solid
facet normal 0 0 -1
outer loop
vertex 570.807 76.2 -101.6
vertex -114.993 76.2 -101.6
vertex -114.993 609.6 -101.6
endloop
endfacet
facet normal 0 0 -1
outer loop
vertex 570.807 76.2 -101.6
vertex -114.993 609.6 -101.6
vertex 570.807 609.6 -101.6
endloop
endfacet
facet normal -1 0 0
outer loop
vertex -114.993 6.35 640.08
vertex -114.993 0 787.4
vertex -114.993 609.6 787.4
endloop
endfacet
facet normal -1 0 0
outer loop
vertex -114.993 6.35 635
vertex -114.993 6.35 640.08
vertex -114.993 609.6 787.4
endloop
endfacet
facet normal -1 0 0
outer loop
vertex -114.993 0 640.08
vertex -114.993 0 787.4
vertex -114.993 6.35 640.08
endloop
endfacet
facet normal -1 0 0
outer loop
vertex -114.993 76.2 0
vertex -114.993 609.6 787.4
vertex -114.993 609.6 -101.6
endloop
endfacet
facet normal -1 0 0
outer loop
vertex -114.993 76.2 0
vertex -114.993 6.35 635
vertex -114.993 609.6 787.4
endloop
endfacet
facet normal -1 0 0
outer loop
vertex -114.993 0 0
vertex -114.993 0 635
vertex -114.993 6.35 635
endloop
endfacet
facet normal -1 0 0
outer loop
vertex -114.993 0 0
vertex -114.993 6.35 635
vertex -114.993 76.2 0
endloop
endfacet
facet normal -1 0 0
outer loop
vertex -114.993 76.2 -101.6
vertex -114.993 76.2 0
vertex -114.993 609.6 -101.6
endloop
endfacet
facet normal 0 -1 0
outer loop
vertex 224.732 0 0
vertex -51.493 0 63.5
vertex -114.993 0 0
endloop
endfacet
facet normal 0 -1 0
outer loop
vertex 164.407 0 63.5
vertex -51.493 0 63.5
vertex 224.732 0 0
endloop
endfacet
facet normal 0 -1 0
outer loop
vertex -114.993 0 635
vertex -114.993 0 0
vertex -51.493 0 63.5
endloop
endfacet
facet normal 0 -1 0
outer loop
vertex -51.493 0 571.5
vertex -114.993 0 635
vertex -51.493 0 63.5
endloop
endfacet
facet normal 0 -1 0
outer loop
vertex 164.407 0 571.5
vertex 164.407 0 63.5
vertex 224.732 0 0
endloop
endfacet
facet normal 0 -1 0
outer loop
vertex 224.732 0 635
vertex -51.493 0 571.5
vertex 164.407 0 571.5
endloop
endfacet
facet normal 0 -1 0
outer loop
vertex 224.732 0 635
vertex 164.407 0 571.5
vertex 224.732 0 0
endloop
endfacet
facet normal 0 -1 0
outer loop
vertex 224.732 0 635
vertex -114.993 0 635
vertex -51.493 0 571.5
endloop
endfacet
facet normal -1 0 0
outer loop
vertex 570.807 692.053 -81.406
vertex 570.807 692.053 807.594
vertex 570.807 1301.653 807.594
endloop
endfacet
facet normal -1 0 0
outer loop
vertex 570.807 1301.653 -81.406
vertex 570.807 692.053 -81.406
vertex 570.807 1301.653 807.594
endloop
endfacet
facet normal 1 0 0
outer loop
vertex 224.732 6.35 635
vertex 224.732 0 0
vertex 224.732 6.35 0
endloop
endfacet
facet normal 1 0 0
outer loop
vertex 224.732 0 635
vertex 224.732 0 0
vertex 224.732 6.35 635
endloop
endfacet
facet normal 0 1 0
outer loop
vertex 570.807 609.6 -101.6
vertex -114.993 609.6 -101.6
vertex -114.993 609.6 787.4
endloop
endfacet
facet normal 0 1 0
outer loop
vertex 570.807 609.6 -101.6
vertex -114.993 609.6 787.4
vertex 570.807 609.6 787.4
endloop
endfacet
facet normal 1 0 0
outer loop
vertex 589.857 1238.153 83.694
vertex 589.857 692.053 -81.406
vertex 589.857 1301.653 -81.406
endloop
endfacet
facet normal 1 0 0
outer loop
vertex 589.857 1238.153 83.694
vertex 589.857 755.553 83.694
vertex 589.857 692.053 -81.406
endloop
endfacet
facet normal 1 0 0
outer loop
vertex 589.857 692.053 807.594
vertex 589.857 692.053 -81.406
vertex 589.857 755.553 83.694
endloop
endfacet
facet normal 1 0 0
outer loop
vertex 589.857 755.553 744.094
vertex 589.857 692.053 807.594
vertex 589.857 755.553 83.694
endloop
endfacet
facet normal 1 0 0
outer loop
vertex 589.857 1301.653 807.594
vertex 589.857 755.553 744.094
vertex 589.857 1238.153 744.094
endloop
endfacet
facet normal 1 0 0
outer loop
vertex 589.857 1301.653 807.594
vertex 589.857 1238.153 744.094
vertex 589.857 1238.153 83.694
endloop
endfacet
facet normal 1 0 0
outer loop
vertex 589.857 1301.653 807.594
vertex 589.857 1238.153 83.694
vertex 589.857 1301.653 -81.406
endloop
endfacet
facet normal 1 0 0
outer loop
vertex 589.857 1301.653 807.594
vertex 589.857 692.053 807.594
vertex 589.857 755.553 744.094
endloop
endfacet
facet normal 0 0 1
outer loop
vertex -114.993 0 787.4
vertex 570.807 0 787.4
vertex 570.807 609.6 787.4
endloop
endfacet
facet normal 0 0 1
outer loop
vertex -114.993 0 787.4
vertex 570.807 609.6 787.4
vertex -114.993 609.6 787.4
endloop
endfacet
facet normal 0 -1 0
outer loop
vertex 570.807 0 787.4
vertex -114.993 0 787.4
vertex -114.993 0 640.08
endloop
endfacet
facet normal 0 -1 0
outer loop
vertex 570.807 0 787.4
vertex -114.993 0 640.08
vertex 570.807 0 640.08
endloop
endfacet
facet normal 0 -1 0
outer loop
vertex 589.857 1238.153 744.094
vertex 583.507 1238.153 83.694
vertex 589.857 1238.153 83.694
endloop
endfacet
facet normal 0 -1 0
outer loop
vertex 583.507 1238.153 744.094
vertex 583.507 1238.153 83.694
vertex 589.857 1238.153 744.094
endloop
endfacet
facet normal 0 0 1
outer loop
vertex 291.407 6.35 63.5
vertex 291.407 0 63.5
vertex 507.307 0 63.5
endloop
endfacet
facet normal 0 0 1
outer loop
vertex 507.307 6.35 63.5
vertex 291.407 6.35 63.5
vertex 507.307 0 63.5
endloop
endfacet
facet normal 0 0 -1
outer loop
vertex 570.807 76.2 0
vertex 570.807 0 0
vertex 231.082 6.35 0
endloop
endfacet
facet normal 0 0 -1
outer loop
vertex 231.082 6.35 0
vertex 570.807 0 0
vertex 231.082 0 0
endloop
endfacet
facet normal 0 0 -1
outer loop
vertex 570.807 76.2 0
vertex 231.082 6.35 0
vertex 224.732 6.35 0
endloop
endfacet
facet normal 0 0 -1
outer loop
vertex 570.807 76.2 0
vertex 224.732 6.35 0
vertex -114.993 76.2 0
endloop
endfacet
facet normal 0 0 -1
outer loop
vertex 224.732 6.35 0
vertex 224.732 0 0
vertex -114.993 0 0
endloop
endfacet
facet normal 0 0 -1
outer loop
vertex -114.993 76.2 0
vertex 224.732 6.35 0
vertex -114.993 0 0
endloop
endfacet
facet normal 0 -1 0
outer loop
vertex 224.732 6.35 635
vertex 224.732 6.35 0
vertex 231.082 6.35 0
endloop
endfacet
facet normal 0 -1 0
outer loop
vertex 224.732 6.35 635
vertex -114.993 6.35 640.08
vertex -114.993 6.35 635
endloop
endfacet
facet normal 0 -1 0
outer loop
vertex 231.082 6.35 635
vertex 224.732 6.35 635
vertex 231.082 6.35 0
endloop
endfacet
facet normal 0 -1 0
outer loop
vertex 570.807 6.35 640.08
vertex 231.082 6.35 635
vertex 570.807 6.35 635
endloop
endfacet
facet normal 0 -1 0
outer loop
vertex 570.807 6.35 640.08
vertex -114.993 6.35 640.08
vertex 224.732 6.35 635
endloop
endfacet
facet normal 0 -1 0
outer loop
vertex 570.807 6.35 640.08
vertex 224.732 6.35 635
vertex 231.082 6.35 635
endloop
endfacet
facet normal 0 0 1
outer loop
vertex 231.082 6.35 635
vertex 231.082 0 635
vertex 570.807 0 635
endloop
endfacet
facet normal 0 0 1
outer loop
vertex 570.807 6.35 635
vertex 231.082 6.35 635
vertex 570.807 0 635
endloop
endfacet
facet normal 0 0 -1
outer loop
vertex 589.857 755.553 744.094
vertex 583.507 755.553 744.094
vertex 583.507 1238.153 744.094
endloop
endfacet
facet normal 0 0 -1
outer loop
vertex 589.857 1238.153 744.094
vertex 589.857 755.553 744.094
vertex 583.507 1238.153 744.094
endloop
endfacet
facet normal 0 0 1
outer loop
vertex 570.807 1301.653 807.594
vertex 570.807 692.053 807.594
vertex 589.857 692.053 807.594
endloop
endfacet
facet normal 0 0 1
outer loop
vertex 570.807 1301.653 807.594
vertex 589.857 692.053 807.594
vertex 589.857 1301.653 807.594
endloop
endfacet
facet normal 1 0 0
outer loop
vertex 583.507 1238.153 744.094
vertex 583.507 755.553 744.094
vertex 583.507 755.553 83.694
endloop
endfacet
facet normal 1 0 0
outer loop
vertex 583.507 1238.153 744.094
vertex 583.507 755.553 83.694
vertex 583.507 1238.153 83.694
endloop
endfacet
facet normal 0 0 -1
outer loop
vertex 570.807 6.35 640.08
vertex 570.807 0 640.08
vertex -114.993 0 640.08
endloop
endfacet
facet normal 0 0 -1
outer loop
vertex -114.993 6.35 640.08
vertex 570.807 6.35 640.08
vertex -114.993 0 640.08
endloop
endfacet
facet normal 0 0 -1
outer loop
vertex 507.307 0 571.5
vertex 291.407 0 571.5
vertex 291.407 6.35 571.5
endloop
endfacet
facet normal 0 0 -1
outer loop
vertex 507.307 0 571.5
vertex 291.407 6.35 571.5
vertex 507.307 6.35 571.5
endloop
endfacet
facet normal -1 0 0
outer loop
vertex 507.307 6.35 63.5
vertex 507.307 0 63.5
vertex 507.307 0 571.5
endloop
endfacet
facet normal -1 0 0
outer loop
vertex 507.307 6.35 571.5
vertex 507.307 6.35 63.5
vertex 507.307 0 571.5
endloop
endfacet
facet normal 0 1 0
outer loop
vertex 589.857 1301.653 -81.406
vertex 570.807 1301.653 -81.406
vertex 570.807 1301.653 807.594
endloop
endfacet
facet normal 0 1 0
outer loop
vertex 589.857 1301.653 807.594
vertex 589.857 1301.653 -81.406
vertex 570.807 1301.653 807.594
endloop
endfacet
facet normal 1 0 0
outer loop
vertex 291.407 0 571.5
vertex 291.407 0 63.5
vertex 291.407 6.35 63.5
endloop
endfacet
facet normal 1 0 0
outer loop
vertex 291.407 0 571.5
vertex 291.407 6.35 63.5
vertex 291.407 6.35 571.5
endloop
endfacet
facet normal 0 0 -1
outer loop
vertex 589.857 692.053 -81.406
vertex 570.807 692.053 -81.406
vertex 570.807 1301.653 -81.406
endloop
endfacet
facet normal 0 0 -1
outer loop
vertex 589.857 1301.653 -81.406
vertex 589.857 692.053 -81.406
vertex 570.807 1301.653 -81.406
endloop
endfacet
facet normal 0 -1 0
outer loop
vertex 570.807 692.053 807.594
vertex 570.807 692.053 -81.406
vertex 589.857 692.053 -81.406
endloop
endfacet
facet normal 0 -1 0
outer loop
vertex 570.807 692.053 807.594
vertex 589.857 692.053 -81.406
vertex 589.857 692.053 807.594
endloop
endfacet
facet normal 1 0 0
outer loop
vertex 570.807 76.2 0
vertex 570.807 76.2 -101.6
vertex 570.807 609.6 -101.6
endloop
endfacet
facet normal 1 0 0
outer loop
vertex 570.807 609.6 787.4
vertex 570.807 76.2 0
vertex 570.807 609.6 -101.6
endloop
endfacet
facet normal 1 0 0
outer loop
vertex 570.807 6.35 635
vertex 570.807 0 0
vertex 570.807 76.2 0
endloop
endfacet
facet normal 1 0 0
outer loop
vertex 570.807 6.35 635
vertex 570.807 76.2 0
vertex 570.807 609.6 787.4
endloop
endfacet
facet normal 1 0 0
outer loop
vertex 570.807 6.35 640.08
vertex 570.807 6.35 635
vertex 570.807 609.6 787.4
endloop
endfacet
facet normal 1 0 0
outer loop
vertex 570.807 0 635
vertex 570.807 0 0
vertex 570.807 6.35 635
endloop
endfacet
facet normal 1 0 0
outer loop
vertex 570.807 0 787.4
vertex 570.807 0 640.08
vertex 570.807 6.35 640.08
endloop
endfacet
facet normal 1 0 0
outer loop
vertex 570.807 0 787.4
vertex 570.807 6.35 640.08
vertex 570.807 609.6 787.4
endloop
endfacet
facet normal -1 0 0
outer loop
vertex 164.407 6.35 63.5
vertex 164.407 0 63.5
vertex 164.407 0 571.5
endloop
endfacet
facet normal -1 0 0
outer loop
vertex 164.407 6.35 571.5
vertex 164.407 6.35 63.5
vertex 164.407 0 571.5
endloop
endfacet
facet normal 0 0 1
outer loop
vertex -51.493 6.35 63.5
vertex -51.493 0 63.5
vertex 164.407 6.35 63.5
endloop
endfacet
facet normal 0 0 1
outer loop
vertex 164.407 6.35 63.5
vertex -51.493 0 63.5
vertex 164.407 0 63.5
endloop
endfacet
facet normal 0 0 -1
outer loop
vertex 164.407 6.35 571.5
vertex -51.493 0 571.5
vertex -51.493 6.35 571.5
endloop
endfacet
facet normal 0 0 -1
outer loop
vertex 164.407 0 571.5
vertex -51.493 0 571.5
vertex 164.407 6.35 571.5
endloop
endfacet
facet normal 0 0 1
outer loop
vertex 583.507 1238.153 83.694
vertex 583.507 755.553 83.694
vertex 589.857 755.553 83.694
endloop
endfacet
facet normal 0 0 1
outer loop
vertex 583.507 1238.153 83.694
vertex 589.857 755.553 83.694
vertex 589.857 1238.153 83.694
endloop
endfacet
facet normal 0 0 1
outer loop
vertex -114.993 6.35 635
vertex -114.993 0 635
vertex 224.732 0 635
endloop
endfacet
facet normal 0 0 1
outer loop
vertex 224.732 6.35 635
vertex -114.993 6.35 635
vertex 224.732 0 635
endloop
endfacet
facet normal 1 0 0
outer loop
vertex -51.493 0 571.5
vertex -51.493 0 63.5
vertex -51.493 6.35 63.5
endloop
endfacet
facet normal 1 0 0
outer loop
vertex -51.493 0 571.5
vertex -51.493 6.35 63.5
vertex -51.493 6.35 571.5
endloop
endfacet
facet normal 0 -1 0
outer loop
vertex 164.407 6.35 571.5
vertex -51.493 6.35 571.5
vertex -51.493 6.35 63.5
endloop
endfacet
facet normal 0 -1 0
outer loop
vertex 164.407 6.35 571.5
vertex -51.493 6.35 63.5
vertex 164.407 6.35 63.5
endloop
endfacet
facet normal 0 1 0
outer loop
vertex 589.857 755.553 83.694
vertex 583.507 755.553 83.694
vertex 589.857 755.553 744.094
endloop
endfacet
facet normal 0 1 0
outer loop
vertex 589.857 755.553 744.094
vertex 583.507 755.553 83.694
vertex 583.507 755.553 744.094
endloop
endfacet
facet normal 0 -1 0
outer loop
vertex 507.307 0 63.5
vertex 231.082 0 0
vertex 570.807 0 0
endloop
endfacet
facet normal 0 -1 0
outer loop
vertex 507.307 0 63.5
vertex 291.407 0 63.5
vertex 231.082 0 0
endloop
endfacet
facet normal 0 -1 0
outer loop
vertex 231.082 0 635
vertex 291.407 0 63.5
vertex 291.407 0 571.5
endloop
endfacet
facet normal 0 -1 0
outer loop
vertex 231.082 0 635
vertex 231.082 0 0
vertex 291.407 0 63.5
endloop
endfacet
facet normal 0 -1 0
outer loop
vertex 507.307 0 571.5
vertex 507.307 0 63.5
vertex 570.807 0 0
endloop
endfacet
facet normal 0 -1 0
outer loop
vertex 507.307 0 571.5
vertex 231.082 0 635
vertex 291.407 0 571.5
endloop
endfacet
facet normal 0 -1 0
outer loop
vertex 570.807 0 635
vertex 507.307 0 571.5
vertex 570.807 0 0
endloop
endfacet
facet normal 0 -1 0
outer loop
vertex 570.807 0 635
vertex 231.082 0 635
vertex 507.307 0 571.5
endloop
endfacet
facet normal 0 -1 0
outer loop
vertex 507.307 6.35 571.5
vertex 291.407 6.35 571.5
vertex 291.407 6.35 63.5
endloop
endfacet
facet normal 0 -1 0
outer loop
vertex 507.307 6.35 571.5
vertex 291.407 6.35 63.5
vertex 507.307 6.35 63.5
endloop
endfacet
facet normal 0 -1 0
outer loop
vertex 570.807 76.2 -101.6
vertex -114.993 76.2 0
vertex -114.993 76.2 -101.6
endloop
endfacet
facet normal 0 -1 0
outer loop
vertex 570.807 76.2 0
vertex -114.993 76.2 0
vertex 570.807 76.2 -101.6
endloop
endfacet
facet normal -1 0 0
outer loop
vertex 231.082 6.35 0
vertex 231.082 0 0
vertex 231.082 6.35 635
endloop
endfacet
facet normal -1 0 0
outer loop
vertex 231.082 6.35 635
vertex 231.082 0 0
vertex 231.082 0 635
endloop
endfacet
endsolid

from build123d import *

# Parameters (mm, degrees)
F0_W     = 3.175
F0_H     = 635
F0_W_2   = 339.725
F0_W_3   = 215.9
F0_H_2   = 508
F0_W_4   = 342.9
F0_H_3   = 147.32
F1_DEPTH = 609.6
F2_DEPTH = 6.35
F3_DEPTH = 76.2
F4_W     = 609.6
F4_H     = 889
F4_W_2   = 482.6
F4_H_2   = 660.4
F5_DEPTH = 19.05
F6_DEPTH = 12.7


with BuildPart() as f1:
    # F0 (on Front) → F1 (new body)
    with BuildSketch(Plane.XZ):
        Polygon((227.9072425127, -101.6), (227.9072425127, 0), (224.7322425127, 0), (-114.9927574873, 0), (-114.9927574873, -101.6), align=None)
        with Locations((226.3197425127, 317.5)):
            Rectangle(F0_W, F0_H)
        Polygon((231.0822425127, 0), (227.9072425127, 0), (227.9072425127, -101.6), (570.8072425127, -101.6), (570.8072425127, 0), align=None)
        with Locations((229.4947425127, 317.5)):
            Rectangle(F0_W, F0_H)
        with Locations((54.8697425127, 317.5)):
            Rectangle(F0_W_2, F0_H)
        with Locations((56.4572425127, 317.5)):
            Rectangle(F0_W_3, F0_H_2, mode=Mode.SUBTRACT)
        Polygon((224.7322425127, 635), (227.9072425127, 635), (227.9072425127, 640.08), (-114.9927574873, 640.08), (-114.9927574873, 635), align=None)
        Polygon((227.9072425127, 640.08), (227.9072425127, 635), (231.0822425127, 635), (570.8072425127, 635), (570.8072425127, 640.08), align=None)
        with Locations((400.9447425127, 317.5)):
            Rectangle(F0_W_2, F0_H)
        with Locations((399.3572425127, 317.5)):
            Rectangle(F0_W_3, F0_H_2, mode=Mode.SUBTRACT)
        with Locations((56.4572425127, 713.74)):
            Rectangle(F0_W_4, F0_H_3)
        with Locations((399.3572425127, 713.74)):
            Rectangle(F0_W_4, F0_H_3)
        with Locations((56.4572425127, 317.5)):
            Rectangle(F0_W_3, F0_H_2)
        with Locations((399.3572425127, 317.5)):
            Rectangle(F0_W_3, F0_H_2)
    extrude(amount=-F1_DEPTH)

    # F0 (on Front) → F2 (cut)
    with BuildSketch(Plane.XZ):
        with Locations((226.3197425127, 317.5)):
            Rectangle(F0_W, F0_H)
        with Locations((229.4947425127, 317.5)):
            Rectangle(F0_W, F0_H)
        Polygon((224.7322425127, 635), (227.9072425127, 635), (227.9072425127, 640.08), (-114.9927574873, 640.08), (-114.9927574873, 635), align=None)
        Polygon((227.9072425127, 640.08), (227.9072425127, 635), (231.0822425127, 635), (570.8072425127, 635), (570.8072425127, 640.08), align=None)
        with Locations((56.4572425127, 317.5)):
            Rectangle(F0_W_3, F0_H_2)
        with Locations((399.3572425127, 317.5)):
            Rectangle(F0_W_3, F0_H_2)
    extrude(amount=-F2_DEPTH, mode=Mode.SUBTRACT)

    # F0 (on Front) → F3 (cut)
    with BuildSketch(Plane.XZ):
        Polygon((227.9072425127, -101.6), (227.9072425127, 0), (224.7322425127, 0), (-114.9927574873, 0), (-114.9927574873, -101.6), align=None)
        Polygon((231.0822425127, 0), (227.9072425127, 0), (227.9072425127, -101.6), (570.8072425127, -101.6), (570.8072425127, 0), align=None)
    extrude(amount=-F3_DEPTH, mode=Mode.SUBTRACT)


with BuildPart() as f5:
    # F4 (on face) → F5 (new body)
    with BuildSketch(Plane.YZ.offset(570.8072425127)):
        with Locations((996.8526720047, 363.0936748981)):
            Rectangle(F4_W, F4_H)
        with Locations((996.8526720047, 413.8936748981)):
            Rectangle(F4_W_2, F4_H_2, mode=Mode.SUBTRACT)
    extrude(amount=F5_DEPTH)

    # F4 (on face) → F6 (join)
    with BuildSketch(Plane.YZ.offset(570.8072425127)):
        with Locations((996.8526720047, 413.8936748981)):
            Rectangle(F4_W_2, F4_H_2)
    extrude(amount=F6_DEPTH)


solid = Compound([f1.part, f5.part])
